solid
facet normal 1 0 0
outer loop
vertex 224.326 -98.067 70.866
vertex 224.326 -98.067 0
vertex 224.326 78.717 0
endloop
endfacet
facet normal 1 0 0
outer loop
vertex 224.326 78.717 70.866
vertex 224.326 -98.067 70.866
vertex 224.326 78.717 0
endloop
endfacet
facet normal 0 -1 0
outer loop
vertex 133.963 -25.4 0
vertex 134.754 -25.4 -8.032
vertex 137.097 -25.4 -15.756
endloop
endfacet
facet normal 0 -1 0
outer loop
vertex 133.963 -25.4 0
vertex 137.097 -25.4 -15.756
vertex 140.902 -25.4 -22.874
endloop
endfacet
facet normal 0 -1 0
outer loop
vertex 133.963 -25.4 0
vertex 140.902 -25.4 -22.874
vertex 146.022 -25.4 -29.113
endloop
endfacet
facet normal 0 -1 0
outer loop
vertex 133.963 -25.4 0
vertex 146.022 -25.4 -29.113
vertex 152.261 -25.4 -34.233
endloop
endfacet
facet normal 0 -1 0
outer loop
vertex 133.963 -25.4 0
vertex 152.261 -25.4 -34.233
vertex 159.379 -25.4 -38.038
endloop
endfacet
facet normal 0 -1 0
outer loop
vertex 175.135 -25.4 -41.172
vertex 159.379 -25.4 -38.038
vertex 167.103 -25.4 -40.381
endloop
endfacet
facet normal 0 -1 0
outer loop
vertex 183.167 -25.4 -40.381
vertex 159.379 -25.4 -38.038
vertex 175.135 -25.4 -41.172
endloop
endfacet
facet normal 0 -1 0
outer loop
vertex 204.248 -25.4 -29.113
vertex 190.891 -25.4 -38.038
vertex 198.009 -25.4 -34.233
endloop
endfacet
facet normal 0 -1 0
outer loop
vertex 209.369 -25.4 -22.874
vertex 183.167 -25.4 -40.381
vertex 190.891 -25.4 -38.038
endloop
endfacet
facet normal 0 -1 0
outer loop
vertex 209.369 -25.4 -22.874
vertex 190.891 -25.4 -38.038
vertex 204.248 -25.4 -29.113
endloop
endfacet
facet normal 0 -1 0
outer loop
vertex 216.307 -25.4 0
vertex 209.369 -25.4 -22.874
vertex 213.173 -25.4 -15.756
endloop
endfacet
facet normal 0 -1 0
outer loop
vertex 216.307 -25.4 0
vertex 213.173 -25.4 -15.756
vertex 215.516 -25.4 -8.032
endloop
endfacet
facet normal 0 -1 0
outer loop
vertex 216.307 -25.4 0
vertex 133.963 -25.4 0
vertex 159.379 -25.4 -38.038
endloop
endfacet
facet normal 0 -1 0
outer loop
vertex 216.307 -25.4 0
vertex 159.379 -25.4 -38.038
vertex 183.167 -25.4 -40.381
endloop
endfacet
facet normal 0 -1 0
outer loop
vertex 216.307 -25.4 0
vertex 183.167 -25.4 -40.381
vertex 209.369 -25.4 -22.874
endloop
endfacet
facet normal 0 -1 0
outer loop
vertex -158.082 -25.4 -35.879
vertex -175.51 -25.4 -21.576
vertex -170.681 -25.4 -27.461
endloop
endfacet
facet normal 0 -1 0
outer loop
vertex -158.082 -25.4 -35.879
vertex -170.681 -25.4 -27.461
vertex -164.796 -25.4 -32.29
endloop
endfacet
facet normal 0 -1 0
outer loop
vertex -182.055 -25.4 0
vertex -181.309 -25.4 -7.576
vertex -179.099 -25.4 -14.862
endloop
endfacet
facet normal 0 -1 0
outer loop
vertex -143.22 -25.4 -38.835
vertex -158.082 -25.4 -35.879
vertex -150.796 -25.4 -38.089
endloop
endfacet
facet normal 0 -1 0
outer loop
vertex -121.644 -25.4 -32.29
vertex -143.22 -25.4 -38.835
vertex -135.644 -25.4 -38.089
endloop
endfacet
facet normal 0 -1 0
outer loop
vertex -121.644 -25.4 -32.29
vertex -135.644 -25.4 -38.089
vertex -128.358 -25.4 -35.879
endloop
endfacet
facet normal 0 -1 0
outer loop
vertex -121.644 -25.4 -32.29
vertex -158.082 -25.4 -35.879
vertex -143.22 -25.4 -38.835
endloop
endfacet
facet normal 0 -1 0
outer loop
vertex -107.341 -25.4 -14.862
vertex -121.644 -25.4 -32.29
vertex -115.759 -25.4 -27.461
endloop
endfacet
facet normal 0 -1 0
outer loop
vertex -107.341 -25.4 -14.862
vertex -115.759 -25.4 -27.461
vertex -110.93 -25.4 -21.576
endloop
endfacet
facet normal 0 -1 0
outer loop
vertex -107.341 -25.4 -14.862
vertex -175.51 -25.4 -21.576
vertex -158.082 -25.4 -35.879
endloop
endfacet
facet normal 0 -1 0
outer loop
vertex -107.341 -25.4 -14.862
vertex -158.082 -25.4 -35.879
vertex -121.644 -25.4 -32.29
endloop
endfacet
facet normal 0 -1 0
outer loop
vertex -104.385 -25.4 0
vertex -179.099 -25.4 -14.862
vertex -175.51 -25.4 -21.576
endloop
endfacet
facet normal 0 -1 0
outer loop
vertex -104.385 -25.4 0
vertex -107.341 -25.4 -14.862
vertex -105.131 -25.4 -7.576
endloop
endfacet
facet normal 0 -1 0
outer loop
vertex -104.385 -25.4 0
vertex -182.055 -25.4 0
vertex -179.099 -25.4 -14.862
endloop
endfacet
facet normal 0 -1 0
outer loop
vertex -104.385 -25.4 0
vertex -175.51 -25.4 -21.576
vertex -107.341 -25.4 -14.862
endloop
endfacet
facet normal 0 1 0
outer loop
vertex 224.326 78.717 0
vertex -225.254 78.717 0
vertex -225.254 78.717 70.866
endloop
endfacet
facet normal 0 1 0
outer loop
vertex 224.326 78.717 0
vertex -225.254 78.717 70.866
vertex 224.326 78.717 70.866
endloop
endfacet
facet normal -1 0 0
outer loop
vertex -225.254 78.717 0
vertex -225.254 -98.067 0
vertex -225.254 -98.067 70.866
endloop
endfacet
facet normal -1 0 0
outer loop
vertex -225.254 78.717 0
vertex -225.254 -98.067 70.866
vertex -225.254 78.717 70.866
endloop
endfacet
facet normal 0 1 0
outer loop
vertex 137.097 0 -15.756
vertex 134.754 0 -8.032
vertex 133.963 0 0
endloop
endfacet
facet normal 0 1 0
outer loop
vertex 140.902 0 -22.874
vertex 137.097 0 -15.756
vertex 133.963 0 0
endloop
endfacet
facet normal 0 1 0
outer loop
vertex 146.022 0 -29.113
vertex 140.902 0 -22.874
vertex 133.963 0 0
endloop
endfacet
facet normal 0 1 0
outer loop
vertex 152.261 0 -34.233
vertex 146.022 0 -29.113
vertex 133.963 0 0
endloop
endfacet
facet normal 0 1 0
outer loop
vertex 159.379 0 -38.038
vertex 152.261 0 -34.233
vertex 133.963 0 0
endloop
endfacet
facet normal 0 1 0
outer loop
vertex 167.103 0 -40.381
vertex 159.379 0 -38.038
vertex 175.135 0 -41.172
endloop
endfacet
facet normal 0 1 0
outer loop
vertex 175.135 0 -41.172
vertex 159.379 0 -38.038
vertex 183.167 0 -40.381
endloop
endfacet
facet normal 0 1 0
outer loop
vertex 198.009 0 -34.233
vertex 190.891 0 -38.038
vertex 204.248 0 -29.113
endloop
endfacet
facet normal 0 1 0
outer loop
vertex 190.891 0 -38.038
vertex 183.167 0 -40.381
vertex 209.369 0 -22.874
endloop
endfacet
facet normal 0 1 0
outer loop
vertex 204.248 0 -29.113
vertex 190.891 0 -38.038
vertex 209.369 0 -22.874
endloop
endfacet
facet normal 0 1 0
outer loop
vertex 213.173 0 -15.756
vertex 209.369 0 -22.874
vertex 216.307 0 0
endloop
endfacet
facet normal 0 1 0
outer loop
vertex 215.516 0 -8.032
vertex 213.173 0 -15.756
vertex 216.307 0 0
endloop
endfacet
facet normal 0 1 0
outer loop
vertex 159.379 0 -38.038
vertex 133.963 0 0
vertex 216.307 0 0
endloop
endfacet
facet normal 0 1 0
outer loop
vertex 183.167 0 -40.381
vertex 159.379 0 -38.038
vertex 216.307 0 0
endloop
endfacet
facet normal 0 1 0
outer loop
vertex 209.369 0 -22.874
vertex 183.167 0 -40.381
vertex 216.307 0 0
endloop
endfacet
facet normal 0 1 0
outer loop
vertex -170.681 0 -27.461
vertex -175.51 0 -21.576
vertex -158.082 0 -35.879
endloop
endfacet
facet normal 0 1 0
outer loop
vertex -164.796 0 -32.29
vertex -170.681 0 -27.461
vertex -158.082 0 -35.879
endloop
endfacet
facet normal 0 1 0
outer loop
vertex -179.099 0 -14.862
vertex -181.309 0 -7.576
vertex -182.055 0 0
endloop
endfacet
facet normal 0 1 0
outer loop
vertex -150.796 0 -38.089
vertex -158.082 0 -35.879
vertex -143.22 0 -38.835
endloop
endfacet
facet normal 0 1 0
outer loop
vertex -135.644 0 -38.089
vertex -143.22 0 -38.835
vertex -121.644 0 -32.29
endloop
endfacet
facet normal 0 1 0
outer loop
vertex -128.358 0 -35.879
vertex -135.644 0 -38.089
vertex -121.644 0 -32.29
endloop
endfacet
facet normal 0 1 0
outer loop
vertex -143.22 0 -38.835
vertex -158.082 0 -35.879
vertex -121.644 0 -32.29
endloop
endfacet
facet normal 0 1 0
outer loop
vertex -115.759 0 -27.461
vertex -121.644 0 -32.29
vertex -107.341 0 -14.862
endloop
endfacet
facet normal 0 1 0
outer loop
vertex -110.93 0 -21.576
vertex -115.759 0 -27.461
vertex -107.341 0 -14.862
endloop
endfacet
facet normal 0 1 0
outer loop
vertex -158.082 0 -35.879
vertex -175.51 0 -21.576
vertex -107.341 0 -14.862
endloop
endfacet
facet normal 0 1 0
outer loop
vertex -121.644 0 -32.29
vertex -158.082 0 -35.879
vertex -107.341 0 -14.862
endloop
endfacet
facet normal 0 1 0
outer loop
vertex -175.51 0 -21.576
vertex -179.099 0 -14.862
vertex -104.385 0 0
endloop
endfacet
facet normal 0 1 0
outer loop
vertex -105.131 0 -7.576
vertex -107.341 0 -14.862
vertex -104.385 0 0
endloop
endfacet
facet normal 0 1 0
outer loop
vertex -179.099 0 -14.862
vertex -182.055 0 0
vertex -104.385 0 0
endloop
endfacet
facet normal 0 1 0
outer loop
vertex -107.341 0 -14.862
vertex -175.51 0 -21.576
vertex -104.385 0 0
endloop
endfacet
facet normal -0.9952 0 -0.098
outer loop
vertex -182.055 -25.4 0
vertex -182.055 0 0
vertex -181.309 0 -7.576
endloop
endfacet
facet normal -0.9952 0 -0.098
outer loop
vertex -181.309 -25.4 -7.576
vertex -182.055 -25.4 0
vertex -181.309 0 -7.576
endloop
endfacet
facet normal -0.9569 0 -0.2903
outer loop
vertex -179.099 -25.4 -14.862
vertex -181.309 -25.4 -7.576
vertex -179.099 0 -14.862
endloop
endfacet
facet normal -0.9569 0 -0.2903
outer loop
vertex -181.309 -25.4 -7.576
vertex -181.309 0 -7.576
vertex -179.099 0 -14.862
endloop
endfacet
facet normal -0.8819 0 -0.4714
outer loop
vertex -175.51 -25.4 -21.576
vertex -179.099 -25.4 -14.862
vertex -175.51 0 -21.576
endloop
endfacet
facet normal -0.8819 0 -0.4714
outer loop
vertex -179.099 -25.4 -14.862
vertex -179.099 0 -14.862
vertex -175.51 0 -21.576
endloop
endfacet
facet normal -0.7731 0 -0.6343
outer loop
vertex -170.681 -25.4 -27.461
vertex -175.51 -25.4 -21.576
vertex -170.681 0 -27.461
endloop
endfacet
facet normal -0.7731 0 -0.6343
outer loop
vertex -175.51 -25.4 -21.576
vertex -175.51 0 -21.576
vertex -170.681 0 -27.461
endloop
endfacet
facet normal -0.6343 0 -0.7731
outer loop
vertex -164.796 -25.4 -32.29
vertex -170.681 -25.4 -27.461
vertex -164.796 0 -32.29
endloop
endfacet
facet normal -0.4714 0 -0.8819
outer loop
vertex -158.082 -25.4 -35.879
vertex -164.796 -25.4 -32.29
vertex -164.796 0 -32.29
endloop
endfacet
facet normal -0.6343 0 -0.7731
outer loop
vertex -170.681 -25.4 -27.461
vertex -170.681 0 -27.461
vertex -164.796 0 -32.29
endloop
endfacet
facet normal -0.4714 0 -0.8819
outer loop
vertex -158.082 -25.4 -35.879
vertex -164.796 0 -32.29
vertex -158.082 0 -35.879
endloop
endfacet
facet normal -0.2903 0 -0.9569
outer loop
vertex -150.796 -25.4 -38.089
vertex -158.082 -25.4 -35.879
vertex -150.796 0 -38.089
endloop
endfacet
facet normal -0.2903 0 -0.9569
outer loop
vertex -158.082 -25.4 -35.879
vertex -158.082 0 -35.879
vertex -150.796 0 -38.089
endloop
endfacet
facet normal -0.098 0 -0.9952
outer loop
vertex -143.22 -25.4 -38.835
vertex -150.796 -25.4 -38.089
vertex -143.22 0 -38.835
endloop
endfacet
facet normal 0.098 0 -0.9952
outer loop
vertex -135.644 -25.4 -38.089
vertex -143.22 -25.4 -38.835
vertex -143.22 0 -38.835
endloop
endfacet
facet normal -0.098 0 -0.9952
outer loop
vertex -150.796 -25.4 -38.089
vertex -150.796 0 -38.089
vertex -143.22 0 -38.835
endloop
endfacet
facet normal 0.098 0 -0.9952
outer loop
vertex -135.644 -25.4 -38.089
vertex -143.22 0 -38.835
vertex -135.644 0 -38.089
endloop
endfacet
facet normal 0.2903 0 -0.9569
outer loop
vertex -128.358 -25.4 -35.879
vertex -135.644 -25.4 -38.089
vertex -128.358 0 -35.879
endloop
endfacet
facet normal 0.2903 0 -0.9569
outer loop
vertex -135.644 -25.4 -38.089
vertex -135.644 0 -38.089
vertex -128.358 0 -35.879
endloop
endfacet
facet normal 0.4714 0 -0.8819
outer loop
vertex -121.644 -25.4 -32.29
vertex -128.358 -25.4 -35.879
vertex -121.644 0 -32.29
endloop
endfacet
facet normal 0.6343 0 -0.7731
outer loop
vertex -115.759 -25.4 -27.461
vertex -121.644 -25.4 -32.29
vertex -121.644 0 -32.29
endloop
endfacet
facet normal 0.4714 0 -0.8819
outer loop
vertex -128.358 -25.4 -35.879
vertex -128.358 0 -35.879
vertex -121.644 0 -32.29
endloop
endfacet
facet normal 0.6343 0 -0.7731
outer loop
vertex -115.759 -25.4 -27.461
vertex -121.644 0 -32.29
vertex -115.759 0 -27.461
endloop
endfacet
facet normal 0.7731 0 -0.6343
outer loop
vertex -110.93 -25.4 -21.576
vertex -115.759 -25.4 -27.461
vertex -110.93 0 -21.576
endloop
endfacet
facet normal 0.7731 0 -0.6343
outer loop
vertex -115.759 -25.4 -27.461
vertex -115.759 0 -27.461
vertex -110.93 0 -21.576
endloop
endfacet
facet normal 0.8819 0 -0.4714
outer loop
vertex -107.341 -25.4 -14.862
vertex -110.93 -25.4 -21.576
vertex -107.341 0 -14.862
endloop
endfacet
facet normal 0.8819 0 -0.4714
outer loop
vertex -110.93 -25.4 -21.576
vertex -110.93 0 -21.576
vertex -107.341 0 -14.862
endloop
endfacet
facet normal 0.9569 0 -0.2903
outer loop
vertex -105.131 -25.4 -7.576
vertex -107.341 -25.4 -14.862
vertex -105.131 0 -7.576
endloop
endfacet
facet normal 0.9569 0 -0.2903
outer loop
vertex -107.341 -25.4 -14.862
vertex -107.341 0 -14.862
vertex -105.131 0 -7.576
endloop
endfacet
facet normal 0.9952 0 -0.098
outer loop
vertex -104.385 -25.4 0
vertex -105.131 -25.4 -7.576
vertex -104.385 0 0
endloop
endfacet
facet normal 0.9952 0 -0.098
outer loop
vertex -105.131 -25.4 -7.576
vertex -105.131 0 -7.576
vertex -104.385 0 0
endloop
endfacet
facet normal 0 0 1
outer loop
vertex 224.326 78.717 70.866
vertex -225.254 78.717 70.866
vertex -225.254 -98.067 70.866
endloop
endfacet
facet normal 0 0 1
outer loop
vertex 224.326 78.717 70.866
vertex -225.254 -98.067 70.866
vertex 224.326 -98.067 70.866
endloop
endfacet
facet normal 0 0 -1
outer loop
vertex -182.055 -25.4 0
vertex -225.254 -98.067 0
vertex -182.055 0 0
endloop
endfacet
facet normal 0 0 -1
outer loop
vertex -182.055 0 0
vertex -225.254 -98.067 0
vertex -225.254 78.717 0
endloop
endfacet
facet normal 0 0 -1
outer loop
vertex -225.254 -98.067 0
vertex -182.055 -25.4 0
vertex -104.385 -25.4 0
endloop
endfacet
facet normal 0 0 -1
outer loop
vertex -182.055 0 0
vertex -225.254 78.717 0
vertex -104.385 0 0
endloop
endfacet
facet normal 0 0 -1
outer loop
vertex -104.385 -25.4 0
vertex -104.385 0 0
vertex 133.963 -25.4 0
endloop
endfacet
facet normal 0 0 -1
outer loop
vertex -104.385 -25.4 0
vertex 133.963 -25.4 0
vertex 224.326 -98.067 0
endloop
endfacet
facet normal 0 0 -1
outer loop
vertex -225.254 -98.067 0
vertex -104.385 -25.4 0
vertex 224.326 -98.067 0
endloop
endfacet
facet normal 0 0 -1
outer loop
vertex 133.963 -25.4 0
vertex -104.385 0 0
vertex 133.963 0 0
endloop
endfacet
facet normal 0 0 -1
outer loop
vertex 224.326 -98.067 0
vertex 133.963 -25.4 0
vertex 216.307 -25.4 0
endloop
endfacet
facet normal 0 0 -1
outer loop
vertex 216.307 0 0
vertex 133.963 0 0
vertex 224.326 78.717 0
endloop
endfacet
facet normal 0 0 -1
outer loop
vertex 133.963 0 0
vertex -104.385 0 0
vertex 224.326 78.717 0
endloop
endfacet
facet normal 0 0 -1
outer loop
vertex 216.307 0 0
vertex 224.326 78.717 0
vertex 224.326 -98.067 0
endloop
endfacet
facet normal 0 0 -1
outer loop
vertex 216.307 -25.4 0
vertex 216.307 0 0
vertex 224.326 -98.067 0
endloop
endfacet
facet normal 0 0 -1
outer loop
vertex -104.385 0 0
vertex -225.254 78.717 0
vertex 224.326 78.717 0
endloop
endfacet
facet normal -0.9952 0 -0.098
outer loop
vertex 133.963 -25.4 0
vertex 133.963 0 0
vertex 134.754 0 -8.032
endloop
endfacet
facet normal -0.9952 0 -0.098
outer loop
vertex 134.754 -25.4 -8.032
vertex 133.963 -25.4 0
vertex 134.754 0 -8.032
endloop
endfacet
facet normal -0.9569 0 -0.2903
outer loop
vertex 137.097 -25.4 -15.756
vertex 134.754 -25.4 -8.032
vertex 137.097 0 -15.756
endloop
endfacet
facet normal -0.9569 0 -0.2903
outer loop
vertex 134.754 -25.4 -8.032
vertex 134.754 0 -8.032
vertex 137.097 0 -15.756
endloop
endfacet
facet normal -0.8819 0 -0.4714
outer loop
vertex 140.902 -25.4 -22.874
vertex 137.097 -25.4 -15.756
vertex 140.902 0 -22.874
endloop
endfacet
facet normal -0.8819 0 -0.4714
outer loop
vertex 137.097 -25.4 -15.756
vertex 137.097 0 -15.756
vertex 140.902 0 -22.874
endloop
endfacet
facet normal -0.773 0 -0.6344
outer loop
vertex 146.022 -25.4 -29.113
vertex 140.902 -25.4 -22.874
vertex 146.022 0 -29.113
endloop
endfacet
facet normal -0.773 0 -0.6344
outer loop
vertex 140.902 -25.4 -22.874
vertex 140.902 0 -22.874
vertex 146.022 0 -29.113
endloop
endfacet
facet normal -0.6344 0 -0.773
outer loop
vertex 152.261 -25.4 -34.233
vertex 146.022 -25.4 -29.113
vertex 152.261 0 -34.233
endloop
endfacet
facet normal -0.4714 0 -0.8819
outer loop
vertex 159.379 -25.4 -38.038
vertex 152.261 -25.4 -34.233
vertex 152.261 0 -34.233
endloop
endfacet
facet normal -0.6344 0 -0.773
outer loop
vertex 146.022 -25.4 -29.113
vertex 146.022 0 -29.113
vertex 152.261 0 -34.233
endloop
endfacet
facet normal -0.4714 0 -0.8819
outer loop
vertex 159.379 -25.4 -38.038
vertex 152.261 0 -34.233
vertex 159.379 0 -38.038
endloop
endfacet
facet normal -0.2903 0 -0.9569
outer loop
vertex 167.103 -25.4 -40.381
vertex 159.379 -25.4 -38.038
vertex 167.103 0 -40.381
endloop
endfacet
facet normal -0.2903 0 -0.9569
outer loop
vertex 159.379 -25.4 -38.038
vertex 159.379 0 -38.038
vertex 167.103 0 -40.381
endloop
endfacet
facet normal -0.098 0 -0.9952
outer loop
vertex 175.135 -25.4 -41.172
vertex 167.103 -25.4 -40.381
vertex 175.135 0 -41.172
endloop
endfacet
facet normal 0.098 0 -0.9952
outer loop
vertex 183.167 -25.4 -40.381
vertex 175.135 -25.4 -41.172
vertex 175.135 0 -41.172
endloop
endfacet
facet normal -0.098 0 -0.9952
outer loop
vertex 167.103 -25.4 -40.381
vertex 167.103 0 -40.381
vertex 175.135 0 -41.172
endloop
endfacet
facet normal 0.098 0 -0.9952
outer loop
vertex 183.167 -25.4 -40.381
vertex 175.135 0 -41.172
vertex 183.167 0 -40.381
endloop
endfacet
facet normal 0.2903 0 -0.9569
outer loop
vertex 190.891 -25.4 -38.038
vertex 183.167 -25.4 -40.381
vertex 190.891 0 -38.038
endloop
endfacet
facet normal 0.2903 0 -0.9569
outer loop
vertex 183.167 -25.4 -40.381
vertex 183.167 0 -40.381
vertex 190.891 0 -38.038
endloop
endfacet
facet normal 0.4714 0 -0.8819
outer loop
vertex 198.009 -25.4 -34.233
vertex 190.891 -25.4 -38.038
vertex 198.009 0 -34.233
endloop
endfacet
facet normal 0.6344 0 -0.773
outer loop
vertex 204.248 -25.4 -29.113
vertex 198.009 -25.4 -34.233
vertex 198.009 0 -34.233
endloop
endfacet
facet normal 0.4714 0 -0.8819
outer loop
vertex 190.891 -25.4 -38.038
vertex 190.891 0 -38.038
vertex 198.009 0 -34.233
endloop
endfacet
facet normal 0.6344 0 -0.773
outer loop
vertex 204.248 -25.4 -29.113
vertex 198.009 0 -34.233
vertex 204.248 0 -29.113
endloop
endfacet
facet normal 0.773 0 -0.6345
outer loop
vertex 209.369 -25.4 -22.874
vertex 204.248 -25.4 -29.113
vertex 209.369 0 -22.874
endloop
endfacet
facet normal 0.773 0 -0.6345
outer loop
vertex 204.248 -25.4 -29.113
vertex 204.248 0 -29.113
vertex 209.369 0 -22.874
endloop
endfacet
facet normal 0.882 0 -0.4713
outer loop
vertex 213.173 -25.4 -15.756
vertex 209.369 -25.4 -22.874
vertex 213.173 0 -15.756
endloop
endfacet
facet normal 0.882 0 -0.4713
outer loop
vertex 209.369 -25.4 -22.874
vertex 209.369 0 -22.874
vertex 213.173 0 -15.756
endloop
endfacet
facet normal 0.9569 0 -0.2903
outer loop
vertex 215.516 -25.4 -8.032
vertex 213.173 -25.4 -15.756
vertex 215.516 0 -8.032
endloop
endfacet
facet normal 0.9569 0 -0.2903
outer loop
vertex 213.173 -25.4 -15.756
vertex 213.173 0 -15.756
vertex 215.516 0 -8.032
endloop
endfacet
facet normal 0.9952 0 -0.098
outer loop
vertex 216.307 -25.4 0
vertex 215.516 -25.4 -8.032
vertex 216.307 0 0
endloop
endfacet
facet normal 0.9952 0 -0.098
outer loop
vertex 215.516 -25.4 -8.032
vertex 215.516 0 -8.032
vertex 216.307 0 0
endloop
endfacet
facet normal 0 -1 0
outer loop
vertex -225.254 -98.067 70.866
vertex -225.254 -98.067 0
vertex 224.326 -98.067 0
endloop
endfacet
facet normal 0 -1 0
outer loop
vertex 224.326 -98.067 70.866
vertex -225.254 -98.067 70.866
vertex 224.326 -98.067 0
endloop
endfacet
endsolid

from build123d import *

# Parameters (mm, degrees)
F0_W     = 449.58
F0_H     = 176.784
F1_DEPTH = 70.866
F2_R     = 38.835317
F2_R_2   = 41.172166
F3_DEPTH = 25.4


with BuildPart() as f1:
    # F0 (on Top) → F1 (new body)
    with BuildSketch(Plane.XY):
        with Locations((-0.463787, -9.675345)):
            Rectangle(F0_W, F0_H)
    extrude(amount=F1_DEPTH)

    # F2 (on Front) → F3 (join)
    with BuildSketch(Plane.XZ):
        with Locations((-143.220037, 0)):
            Circle(F2_R)
        with Locations((175.135151, 0)):
            Circle(F2_R_2)
    extrude(amount=F3_DEPTH)


solid = f1.part
